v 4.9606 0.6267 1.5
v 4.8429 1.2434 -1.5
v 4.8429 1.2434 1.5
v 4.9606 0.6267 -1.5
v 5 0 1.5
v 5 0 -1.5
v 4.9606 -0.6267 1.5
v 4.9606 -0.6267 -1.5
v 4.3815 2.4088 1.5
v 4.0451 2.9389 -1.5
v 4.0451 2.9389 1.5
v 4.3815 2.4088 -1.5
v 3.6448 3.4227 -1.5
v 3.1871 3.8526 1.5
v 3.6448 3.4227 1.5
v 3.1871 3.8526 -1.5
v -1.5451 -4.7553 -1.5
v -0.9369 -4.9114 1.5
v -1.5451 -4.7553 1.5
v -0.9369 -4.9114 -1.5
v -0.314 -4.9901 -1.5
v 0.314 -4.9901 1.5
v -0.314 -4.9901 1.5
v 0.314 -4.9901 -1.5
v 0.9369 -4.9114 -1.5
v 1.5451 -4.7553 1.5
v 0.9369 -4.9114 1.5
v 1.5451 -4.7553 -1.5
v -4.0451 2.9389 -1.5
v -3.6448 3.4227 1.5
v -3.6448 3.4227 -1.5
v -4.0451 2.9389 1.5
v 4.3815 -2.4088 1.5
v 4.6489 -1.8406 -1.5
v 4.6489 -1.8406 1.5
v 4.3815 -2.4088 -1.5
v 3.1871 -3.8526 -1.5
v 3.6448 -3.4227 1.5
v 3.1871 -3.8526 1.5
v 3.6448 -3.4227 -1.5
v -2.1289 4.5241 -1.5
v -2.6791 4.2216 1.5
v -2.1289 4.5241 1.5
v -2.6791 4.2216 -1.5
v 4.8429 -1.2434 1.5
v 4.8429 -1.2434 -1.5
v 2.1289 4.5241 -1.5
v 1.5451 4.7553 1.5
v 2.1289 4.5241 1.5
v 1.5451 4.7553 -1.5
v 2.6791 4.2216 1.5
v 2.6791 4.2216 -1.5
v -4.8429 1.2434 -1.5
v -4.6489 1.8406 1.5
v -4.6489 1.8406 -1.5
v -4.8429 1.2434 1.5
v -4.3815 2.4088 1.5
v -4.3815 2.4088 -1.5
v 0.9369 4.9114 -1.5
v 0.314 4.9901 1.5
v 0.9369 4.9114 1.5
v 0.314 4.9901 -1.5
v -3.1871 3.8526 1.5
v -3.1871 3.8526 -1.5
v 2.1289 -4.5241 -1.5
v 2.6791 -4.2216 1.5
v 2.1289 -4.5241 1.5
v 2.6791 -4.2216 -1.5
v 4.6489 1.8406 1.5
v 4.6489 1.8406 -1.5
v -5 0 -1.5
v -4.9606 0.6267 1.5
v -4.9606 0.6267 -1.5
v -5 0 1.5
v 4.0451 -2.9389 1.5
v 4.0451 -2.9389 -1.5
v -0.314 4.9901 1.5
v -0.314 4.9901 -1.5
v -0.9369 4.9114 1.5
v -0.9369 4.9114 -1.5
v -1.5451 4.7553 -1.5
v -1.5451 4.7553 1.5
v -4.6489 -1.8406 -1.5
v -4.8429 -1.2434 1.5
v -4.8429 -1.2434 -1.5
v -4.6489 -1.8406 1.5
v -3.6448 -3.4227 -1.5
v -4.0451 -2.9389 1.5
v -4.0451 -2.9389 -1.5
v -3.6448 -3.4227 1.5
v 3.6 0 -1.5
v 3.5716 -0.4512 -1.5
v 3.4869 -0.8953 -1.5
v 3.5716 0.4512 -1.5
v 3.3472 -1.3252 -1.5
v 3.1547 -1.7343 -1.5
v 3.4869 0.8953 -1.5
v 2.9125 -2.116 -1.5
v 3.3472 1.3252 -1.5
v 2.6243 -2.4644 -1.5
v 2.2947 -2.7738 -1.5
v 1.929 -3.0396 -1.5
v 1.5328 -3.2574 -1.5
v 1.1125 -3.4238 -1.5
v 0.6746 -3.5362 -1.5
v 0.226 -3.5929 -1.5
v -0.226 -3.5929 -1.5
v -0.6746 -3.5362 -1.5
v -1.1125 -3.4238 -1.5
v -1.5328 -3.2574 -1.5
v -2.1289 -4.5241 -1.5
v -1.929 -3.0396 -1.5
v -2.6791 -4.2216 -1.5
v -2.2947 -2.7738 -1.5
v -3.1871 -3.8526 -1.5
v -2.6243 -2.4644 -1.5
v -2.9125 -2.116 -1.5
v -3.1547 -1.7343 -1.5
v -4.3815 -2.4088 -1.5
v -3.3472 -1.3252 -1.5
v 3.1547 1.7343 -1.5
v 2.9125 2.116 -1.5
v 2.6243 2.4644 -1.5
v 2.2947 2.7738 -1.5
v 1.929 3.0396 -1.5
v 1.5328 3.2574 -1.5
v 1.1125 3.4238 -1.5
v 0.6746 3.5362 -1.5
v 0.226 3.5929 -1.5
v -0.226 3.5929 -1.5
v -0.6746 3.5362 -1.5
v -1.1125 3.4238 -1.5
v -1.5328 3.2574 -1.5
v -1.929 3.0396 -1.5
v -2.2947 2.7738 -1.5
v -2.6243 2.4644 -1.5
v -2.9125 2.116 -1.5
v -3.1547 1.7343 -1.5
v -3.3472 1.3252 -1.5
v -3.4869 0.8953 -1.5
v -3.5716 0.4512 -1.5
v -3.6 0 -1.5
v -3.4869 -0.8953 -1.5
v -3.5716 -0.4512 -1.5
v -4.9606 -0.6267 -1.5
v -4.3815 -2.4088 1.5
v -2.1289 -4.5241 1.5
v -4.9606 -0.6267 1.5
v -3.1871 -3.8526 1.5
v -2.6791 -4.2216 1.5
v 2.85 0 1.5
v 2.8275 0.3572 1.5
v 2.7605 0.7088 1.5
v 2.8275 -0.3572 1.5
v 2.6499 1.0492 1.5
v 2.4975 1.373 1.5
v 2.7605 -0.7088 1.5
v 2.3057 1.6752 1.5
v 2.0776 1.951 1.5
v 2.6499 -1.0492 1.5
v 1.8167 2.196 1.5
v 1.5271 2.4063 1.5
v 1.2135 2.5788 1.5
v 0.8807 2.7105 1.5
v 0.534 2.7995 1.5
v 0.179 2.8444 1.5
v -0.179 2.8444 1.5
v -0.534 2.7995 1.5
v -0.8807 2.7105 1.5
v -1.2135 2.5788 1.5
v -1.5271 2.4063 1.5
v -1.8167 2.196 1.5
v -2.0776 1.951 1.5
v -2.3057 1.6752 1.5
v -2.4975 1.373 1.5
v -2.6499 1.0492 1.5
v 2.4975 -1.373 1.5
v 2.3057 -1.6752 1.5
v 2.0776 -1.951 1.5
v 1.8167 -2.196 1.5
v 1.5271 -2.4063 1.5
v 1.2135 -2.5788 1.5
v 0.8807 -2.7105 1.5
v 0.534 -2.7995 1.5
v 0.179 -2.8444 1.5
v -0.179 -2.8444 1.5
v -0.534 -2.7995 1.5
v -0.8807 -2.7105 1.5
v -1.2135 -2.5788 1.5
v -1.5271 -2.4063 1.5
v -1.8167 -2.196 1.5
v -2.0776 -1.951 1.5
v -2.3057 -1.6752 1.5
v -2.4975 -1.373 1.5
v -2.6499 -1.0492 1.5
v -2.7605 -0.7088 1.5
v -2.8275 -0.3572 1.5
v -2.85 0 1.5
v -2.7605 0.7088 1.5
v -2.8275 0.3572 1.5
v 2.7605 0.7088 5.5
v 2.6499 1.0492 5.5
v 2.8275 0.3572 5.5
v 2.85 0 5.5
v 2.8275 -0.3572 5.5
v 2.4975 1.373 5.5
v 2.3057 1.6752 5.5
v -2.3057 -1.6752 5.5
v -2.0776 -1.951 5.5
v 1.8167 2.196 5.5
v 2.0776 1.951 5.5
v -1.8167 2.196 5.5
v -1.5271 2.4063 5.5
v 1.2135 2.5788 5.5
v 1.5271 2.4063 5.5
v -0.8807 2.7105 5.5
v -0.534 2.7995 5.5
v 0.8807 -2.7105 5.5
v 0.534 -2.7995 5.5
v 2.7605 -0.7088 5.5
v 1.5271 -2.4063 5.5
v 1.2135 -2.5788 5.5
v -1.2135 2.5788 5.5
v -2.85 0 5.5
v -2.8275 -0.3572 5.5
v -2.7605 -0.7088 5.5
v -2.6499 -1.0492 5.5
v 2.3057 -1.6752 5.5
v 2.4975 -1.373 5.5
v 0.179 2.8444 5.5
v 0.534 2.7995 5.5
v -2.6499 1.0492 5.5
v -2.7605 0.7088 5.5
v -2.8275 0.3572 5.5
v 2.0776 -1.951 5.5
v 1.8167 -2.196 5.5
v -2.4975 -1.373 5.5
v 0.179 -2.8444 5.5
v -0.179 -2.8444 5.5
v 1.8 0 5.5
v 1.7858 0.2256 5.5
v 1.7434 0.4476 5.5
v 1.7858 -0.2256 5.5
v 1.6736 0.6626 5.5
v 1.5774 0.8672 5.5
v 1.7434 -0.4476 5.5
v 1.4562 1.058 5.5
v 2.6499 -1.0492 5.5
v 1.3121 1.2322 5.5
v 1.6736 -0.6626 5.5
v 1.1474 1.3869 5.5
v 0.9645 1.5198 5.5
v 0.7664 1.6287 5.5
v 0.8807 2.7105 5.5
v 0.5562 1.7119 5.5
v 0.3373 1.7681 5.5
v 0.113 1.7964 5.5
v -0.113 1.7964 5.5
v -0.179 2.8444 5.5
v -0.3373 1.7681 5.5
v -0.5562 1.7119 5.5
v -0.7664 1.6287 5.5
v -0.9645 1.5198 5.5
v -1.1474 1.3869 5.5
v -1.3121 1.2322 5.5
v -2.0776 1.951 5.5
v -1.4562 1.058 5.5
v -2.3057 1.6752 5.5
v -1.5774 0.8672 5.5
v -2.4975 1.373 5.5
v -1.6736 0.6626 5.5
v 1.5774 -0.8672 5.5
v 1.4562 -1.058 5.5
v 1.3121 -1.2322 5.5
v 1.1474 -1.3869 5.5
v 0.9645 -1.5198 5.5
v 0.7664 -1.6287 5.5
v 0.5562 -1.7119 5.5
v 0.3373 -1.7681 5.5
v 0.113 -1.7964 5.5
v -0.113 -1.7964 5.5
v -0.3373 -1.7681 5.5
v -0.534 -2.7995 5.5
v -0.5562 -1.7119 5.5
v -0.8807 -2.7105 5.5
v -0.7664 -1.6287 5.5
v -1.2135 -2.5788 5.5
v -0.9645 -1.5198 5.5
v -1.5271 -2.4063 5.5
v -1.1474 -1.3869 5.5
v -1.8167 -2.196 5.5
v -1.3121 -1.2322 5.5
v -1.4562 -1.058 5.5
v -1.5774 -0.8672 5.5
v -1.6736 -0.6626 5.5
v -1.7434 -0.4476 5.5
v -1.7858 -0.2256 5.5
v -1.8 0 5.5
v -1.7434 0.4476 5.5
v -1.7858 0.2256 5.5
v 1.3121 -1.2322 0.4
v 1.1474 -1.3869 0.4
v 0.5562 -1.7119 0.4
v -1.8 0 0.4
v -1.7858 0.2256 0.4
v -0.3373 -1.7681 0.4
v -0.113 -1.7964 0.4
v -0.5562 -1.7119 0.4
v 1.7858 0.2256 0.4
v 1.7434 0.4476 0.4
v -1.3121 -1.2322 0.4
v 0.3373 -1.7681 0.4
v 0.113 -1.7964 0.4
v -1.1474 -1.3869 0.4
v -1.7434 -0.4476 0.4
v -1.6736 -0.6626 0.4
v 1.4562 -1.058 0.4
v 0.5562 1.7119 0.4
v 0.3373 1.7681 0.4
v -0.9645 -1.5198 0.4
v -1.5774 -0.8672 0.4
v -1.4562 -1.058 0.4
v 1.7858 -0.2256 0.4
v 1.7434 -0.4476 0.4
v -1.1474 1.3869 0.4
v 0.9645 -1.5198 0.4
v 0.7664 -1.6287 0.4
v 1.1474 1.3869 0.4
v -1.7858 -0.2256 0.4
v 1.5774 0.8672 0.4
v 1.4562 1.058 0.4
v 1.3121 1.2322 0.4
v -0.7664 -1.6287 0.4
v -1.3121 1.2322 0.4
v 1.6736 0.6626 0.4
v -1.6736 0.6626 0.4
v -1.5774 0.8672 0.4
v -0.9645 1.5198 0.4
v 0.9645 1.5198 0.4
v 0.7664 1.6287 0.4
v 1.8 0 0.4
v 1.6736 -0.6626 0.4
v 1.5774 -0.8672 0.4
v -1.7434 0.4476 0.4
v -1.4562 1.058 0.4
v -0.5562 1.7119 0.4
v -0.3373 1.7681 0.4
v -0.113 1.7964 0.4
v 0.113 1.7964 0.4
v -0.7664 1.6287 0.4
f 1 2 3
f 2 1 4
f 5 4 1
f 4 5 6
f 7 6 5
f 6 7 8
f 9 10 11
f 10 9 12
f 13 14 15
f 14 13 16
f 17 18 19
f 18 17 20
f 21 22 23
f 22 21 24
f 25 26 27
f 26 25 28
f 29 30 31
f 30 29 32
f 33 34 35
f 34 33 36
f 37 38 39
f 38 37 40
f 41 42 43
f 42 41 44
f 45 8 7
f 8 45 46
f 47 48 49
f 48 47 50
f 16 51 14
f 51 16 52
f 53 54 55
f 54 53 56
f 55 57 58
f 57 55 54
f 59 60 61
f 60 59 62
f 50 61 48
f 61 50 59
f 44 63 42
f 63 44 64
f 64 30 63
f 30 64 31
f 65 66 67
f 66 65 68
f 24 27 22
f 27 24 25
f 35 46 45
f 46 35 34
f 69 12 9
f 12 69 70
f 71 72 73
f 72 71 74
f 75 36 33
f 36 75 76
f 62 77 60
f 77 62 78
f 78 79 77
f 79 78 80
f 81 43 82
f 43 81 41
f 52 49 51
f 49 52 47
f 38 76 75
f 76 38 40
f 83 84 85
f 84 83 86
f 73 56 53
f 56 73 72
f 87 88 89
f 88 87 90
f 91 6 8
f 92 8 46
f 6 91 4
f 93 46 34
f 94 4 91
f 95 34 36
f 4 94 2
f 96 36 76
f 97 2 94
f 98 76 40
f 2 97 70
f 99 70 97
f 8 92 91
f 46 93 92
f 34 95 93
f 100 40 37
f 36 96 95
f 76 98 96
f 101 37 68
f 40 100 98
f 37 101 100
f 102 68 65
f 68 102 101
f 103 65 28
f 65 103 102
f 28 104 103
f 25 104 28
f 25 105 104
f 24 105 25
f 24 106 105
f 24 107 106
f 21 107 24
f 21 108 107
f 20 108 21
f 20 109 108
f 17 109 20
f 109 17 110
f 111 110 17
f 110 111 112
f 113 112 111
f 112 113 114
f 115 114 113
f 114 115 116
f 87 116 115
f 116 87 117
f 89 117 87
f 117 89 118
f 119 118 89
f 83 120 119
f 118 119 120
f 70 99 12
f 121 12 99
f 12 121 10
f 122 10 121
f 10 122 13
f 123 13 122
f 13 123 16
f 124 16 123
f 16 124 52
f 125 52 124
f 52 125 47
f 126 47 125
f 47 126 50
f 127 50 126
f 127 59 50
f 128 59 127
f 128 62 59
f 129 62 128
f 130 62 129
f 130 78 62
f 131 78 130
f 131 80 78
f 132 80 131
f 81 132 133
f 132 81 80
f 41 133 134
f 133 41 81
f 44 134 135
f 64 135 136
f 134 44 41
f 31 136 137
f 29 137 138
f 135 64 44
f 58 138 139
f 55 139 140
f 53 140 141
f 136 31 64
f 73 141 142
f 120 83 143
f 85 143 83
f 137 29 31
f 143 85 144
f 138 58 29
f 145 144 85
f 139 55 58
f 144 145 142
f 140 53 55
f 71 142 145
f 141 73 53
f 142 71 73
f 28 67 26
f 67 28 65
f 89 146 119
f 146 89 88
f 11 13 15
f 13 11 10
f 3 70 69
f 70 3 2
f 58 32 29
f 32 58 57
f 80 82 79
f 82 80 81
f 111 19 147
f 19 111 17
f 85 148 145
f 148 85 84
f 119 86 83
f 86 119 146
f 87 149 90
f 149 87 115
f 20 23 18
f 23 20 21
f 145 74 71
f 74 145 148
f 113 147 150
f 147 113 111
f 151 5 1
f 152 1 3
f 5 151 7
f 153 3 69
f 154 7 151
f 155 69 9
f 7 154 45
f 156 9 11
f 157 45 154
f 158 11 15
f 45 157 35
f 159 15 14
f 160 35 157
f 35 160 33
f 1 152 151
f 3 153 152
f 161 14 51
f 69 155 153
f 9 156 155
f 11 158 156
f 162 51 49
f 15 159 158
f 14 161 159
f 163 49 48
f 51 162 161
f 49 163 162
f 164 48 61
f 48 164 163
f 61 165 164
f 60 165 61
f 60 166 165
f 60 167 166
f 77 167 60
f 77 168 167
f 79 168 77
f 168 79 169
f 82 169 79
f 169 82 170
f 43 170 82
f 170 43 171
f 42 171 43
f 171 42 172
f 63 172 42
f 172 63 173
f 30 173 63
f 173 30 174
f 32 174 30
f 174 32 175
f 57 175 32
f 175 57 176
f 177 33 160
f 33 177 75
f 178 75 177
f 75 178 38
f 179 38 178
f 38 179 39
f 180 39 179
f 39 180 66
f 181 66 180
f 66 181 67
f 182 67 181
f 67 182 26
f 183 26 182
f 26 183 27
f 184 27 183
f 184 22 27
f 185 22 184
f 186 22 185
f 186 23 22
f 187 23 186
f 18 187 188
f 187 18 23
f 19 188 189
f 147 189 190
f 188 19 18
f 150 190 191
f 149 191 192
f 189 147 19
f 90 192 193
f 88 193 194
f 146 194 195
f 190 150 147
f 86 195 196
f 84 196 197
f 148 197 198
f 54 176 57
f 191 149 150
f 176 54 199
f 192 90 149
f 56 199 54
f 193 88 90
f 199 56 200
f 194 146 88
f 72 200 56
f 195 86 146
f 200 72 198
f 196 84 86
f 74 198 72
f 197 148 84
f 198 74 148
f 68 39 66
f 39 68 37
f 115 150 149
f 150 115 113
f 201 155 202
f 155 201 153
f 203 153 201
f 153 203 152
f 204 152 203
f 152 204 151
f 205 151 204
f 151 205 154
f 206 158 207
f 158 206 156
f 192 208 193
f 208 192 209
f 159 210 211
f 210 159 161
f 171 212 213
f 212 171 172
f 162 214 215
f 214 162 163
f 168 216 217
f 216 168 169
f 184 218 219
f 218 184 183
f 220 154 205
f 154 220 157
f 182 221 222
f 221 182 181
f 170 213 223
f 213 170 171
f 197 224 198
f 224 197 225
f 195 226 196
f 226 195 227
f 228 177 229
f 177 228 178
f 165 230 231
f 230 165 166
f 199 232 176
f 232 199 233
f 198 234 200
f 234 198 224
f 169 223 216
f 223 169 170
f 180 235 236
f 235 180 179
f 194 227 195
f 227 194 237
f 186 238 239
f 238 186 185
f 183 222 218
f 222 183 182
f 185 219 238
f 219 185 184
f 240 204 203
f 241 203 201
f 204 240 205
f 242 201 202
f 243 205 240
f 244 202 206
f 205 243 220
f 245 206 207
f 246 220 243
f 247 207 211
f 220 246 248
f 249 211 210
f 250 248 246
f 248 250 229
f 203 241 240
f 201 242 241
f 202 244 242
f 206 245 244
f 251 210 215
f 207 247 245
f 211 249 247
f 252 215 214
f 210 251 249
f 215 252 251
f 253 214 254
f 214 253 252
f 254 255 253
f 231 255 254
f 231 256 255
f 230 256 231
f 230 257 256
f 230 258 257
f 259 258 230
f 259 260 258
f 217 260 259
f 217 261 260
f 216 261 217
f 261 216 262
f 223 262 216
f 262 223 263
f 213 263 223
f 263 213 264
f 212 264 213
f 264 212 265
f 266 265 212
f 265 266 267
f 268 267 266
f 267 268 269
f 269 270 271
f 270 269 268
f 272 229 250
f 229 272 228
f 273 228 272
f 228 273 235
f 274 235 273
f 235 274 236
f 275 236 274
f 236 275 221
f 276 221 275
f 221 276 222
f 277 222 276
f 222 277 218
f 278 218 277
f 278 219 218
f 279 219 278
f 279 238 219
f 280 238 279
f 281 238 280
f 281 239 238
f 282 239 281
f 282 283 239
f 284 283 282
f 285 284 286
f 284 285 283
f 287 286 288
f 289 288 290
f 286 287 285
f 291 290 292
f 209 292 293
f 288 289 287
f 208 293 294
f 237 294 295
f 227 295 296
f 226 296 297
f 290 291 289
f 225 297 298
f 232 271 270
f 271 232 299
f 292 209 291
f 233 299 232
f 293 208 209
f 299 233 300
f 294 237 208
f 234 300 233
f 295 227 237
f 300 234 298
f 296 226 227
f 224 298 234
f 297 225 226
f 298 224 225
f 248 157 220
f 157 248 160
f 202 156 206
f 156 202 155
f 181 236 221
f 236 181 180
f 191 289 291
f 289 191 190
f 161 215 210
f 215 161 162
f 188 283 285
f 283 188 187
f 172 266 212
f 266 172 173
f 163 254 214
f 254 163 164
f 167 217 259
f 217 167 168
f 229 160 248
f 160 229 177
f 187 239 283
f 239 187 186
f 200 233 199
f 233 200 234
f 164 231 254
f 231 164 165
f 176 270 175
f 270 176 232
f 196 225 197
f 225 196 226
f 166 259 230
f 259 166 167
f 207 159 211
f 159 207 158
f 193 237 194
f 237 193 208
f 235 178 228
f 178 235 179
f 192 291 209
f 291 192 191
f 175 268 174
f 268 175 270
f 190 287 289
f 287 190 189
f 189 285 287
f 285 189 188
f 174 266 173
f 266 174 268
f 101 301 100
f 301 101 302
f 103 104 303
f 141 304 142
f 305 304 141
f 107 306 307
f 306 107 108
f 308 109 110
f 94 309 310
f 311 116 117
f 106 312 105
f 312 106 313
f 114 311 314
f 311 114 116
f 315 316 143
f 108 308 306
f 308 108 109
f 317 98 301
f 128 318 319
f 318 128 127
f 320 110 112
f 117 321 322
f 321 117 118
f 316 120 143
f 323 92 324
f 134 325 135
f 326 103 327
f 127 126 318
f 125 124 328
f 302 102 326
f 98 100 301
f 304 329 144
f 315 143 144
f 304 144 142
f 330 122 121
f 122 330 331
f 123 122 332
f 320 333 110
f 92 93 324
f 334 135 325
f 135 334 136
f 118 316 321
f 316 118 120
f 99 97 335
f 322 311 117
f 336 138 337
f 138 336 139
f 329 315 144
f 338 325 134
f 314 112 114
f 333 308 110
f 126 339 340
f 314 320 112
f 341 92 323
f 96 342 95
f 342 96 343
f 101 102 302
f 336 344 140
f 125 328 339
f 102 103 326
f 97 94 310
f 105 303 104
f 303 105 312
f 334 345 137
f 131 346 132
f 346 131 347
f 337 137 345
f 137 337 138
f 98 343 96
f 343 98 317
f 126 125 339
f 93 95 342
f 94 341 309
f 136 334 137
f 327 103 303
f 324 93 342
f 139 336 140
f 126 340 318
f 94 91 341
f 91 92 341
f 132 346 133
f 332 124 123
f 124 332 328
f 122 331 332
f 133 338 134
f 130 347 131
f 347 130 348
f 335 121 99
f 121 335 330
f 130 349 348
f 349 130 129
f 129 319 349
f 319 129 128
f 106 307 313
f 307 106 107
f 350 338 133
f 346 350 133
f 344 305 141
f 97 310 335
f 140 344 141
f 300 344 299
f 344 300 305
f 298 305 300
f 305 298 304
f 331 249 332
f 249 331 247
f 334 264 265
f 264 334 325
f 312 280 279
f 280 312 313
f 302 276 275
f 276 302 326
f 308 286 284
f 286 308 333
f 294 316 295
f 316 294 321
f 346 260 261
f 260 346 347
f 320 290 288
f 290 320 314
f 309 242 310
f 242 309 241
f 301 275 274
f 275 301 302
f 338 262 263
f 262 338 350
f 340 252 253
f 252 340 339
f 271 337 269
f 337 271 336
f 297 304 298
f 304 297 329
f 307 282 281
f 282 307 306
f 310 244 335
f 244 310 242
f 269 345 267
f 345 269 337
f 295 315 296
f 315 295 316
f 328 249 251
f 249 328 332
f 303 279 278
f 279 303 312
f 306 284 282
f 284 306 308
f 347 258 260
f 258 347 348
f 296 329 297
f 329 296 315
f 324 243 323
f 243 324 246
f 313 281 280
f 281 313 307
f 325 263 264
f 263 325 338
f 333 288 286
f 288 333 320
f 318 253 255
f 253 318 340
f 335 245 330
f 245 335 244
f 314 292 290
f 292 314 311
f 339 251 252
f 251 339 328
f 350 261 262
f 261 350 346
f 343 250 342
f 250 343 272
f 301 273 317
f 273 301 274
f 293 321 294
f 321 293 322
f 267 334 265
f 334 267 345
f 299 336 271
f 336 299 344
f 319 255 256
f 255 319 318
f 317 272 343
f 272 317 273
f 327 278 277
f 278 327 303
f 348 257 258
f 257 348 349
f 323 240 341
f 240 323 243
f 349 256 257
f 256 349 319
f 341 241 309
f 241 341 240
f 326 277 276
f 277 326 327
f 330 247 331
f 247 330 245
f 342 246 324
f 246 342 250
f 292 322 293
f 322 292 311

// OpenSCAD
$fn = 50;


difference() {
	union() {
		translate(v = [0, 0, -1.5000000000]) {
			cylinder(h = 3, r = 5.0000000000);
		}
		translate(v = [0, 0, -1.5000000000]) {
			cylinder(h = 7, r = 2.8500000000);
		}
	}
	union() {
		translate(v = [0, 0, -1.5000000000]) {
			rotate(a = [0, 180, 0]) {
				difference() {
					union() {
						translate(v = [0, 0, -7.0000000000]) {
							cylinder(h = 7, r = 1.5000000000);
						}
						translate(v = [0, 0, -1.9000000000]) {
							cylinder(h = 1.9000000000, r1 = 1.8000000000, r2 = 3.6000000000);
						}
						translate(v = [0, 0, -7.0000000000]) {
							cylinder(h = 7, r = 1.8000000000);
						}
						translate(v = [0, 0, -7.0000000000]) {
							cylinder(h = 7, r = 1.5000000000);
						}
					}
					union();
				}
			}
		}
		translate(v = [0, 0, -100.0000000000]) {
			cylinder(h = 200, r = 1.8000000000);
		}
	}
}
